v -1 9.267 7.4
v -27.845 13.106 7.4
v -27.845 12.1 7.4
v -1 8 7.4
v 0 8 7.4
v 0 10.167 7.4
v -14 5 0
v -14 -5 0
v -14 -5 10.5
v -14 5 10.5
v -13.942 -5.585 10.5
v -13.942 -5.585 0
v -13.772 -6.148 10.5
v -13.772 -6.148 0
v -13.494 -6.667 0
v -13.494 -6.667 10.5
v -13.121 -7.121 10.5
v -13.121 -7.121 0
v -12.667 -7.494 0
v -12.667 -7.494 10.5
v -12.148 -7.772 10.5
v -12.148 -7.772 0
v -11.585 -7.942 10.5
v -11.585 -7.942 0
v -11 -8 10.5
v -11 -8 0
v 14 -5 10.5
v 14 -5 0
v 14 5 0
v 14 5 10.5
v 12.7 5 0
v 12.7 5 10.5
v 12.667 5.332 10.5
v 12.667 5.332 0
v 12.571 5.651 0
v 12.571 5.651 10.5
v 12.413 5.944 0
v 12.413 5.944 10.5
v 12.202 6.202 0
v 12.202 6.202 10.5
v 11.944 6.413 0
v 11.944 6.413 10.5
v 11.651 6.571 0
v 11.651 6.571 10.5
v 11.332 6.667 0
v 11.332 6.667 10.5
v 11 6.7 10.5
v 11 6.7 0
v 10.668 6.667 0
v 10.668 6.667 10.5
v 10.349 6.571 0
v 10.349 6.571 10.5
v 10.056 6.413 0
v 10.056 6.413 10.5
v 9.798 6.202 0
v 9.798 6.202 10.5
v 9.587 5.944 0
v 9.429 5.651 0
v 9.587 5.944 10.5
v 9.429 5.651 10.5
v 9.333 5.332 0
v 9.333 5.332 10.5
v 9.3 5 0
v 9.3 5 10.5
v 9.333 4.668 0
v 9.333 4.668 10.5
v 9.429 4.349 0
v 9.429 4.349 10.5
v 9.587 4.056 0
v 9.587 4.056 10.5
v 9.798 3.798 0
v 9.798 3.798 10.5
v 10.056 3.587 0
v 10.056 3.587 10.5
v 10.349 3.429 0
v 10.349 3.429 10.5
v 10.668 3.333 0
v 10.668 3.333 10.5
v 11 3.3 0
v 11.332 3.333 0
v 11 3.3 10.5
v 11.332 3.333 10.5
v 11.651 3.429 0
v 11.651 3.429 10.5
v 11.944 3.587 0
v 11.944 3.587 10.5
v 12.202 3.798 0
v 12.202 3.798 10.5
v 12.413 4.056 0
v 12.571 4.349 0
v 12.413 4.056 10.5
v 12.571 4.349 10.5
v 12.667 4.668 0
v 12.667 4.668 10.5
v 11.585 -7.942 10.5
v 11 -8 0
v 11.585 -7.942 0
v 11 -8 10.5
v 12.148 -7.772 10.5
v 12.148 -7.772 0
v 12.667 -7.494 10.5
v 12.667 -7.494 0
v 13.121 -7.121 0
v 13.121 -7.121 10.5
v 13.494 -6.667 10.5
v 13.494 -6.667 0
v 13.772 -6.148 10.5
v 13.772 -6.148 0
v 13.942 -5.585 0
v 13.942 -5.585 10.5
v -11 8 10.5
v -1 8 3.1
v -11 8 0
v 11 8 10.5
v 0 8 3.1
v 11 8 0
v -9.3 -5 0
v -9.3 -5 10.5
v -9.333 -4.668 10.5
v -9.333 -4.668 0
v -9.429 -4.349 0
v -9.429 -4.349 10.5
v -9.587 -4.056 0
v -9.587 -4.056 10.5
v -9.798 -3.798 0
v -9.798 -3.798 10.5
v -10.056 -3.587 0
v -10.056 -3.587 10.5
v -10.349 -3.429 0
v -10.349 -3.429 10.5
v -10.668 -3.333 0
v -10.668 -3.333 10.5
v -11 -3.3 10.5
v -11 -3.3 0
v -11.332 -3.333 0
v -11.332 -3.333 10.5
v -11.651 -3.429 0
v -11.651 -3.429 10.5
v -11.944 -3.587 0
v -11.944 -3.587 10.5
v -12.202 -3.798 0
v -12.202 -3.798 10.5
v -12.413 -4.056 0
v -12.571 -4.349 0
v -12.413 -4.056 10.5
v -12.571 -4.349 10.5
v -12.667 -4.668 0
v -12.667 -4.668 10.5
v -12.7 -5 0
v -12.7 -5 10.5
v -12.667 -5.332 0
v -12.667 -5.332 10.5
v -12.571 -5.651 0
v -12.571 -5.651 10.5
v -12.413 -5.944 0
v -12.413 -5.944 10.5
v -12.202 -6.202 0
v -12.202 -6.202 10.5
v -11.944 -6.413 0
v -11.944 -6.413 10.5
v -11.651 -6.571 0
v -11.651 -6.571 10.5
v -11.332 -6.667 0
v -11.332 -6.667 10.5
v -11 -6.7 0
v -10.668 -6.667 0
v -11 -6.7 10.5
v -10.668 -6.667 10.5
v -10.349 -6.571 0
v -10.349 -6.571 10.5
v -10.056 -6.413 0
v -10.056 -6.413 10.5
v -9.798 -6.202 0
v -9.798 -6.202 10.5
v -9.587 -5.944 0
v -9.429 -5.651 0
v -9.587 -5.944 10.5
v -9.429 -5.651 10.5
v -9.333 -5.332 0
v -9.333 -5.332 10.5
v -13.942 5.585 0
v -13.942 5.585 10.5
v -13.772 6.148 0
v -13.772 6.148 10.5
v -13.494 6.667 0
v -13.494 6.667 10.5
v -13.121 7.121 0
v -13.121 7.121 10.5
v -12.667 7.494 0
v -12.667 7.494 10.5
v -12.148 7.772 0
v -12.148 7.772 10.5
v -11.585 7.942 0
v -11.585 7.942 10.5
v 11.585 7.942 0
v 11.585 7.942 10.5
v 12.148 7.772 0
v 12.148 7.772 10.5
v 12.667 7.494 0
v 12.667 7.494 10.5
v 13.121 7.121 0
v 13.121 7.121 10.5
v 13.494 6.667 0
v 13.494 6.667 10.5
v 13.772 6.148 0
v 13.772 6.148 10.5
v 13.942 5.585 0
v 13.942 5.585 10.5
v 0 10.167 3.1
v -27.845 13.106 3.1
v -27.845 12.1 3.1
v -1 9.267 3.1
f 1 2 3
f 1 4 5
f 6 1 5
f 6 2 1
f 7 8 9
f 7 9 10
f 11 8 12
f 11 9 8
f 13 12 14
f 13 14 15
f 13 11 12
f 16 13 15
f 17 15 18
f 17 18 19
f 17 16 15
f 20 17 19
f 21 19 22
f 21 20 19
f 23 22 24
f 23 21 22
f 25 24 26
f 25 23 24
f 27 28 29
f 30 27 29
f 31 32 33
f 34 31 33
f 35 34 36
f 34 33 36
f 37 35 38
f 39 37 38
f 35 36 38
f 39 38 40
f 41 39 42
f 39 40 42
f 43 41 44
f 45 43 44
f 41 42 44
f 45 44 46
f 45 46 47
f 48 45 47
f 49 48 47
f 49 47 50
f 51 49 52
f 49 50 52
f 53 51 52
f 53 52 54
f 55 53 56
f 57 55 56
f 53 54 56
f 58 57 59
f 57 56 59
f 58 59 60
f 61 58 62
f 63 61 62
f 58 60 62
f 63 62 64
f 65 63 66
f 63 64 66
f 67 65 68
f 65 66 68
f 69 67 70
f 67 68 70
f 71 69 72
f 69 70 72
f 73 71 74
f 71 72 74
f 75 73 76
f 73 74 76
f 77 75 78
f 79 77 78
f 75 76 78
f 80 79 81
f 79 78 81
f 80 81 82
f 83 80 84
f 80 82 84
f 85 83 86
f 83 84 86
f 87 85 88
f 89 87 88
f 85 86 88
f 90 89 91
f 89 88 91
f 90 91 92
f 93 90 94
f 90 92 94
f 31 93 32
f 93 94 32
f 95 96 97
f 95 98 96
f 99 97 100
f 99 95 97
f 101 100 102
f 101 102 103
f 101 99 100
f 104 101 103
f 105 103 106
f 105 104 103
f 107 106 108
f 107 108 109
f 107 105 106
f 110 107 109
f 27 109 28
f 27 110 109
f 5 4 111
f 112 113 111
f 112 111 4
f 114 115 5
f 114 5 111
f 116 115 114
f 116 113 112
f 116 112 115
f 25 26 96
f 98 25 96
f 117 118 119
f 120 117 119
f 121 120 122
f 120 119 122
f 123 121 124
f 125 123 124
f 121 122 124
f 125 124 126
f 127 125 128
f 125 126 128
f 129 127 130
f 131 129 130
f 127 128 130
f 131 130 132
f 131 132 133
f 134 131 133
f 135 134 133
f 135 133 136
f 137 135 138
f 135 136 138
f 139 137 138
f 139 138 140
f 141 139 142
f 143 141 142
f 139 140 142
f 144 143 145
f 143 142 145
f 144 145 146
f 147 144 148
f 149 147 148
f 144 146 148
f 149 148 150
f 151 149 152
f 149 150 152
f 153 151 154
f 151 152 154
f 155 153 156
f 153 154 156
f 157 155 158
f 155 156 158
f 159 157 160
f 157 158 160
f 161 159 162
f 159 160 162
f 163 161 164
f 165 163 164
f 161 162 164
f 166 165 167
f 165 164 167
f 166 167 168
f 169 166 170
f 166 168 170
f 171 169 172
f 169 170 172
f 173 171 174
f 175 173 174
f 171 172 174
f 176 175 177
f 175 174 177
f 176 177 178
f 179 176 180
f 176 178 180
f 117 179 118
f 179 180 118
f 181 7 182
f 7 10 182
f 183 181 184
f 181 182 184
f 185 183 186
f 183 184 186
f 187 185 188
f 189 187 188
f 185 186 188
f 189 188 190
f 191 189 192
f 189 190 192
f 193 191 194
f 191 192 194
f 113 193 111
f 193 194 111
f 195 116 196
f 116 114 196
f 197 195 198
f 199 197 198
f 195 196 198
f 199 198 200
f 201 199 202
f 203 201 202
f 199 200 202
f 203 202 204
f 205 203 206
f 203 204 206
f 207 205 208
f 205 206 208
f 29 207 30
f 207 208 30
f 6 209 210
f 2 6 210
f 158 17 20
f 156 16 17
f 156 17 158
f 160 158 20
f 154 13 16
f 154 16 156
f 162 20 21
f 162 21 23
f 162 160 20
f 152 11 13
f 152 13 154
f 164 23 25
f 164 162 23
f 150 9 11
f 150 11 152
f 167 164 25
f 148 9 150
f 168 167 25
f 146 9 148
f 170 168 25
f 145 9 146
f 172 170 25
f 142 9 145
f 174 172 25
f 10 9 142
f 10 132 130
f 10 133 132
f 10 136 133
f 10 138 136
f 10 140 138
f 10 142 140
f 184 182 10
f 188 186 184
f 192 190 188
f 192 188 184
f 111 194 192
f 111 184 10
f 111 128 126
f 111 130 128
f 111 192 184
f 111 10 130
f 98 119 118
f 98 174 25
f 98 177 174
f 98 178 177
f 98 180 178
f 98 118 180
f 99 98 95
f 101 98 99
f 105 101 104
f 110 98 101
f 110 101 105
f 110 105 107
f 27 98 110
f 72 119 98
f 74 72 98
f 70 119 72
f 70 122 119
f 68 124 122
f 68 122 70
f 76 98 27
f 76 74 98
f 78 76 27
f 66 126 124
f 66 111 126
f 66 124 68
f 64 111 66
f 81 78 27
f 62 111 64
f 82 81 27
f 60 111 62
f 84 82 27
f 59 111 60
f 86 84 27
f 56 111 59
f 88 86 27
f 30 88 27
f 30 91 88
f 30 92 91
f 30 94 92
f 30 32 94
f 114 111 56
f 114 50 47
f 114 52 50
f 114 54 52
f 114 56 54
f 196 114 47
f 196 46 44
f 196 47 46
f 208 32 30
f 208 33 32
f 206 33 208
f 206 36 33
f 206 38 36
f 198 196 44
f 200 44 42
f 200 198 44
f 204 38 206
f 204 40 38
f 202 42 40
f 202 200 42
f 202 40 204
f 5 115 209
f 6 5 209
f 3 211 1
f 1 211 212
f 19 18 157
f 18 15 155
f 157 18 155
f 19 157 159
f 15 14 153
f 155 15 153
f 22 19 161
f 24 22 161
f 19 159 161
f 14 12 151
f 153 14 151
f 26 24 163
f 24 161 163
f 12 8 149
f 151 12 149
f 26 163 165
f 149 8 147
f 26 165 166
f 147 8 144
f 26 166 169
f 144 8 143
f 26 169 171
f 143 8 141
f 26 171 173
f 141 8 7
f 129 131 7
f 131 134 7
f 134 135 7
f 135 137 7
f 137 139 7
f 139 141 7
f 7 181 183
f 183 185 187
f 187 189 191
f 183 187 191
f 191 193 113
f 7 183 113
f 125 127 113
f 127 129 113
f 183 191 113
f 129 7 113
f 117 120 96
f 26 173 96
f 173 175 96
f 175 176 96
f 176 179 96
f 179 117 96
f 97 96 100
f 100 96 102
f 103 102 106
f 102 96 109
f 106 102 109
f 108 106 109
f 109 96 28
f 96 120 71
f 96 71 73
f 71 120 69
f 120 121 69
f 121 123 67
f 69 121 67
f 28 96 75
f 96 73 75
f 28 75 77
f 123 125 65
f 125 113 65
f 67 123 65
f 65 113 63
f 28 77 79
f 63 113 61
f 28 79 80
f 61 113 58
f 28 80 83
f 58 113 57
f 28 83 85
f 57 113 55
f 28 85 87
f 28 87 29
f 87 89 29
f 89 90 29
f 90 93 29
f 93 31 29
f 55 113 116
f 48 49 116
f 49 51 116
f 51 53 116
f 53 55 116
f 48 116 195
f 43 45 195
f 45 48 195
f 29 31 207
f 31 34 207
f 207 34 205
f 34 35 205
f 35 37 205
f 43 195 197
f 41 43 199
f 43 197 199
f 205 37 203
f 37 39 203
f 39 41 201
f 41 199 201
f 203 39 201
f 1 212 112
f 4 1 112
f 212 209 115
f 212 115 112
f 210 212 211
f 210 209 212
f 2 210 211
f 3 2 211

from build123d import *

# Parameters (mm, degrees)
SKETCH_1_W          = 28
SKETCH_1_H          = 16
EXTRUDE_1_DEPTH     = 10.5
SKETCH_2_R          = 1.7
CUT_EXTRUDE_1_DEPTH = 10.5
FILLET_1_R          = 3
EXTRUDE_2_DEPTH     = 10.5
SKETCH_4_W          = 27.845387087
SKETCH_4_H          = 5.10555255
CUT_EXTRUDE_2_DEPTH = 3.1
SKETCH_5_W          = 33.643456051
SKETCH_5_H          = 7.59321446
CUT_EXTRUDE_3_DEPTH = 3.1


with BuildPart() as part:
    # 草图1 → 凸台-拉伸1 (new body)
    with BuildSketch(Plane.XY):
        Rectangle(SKETCH_1_W, SKETCH_1_H)
    extrude(amount=EXTRUDE_1_DEPTH)

    # 草图2 → 切除-拉伸1 (cut)
    with BuildSketch(Plane.XY.offset(10.5)):
        with Locations((-11, -5)):
            Circle(SKETCH_2_R)
        with Locations((11, 5)):
            Circle(SKETCH_2_R)
    extrude(amount=-CUT_EXTRUDE_1_DEPTH, mode=Mode.SUBTRACT)

    # 圆角1
    fillet_1_edges = [part.edges().sort_by_distance(p)[0] for p in [
        (-14, 8, 5.25),
        (14, 8, 5.25),
        (14, -8, 5.25),
        (-14, -8, 5.25),
    ]]
    fillet(fillet_1_edges, radius=FILLET_1_R)

    # 草图3 → 凸台-拉伸2 (add)
    with BuildSketch(Plane.XY):
        Polygon((0, 8), (0, 10.167114537), (-27.845387087, 13.10555255), (-27.845387087, 12.1), (-1, 9.267088909), (-1, 8), align=None)
    extrude(amount=EXTRUDE_2_DEPTH)

    # 草图4 → 切除-拉伸2 (cut)
    with BuildSketch(Plane.XY.offset(10.5)):
        with Locations((-13.922693544, 10.552776275)):
            Rectangle(SKETCH_4_W, SKETCH_4_H)
    extrude(amount=-CUT_EXTRUDE_2_DEPTH, mode=Mode.SUBTRACT)

    # 草图5 → 切除-拉伸3 (cut)
    with BuildSketch(Plane(origin=(0, 0, 0), x_dir=(-1, 0, 0), z_dir=(0, 0, -1))):
        with Locations((16.821728026, 11.79660723)):
            Rectangle(SKETCH_5_W, SKETCH_5_H)
    extrude(amount=-CUT_EXTRUDE_3_DEPTH, mode=Mode.SUBTRACT)


solid = part.part
